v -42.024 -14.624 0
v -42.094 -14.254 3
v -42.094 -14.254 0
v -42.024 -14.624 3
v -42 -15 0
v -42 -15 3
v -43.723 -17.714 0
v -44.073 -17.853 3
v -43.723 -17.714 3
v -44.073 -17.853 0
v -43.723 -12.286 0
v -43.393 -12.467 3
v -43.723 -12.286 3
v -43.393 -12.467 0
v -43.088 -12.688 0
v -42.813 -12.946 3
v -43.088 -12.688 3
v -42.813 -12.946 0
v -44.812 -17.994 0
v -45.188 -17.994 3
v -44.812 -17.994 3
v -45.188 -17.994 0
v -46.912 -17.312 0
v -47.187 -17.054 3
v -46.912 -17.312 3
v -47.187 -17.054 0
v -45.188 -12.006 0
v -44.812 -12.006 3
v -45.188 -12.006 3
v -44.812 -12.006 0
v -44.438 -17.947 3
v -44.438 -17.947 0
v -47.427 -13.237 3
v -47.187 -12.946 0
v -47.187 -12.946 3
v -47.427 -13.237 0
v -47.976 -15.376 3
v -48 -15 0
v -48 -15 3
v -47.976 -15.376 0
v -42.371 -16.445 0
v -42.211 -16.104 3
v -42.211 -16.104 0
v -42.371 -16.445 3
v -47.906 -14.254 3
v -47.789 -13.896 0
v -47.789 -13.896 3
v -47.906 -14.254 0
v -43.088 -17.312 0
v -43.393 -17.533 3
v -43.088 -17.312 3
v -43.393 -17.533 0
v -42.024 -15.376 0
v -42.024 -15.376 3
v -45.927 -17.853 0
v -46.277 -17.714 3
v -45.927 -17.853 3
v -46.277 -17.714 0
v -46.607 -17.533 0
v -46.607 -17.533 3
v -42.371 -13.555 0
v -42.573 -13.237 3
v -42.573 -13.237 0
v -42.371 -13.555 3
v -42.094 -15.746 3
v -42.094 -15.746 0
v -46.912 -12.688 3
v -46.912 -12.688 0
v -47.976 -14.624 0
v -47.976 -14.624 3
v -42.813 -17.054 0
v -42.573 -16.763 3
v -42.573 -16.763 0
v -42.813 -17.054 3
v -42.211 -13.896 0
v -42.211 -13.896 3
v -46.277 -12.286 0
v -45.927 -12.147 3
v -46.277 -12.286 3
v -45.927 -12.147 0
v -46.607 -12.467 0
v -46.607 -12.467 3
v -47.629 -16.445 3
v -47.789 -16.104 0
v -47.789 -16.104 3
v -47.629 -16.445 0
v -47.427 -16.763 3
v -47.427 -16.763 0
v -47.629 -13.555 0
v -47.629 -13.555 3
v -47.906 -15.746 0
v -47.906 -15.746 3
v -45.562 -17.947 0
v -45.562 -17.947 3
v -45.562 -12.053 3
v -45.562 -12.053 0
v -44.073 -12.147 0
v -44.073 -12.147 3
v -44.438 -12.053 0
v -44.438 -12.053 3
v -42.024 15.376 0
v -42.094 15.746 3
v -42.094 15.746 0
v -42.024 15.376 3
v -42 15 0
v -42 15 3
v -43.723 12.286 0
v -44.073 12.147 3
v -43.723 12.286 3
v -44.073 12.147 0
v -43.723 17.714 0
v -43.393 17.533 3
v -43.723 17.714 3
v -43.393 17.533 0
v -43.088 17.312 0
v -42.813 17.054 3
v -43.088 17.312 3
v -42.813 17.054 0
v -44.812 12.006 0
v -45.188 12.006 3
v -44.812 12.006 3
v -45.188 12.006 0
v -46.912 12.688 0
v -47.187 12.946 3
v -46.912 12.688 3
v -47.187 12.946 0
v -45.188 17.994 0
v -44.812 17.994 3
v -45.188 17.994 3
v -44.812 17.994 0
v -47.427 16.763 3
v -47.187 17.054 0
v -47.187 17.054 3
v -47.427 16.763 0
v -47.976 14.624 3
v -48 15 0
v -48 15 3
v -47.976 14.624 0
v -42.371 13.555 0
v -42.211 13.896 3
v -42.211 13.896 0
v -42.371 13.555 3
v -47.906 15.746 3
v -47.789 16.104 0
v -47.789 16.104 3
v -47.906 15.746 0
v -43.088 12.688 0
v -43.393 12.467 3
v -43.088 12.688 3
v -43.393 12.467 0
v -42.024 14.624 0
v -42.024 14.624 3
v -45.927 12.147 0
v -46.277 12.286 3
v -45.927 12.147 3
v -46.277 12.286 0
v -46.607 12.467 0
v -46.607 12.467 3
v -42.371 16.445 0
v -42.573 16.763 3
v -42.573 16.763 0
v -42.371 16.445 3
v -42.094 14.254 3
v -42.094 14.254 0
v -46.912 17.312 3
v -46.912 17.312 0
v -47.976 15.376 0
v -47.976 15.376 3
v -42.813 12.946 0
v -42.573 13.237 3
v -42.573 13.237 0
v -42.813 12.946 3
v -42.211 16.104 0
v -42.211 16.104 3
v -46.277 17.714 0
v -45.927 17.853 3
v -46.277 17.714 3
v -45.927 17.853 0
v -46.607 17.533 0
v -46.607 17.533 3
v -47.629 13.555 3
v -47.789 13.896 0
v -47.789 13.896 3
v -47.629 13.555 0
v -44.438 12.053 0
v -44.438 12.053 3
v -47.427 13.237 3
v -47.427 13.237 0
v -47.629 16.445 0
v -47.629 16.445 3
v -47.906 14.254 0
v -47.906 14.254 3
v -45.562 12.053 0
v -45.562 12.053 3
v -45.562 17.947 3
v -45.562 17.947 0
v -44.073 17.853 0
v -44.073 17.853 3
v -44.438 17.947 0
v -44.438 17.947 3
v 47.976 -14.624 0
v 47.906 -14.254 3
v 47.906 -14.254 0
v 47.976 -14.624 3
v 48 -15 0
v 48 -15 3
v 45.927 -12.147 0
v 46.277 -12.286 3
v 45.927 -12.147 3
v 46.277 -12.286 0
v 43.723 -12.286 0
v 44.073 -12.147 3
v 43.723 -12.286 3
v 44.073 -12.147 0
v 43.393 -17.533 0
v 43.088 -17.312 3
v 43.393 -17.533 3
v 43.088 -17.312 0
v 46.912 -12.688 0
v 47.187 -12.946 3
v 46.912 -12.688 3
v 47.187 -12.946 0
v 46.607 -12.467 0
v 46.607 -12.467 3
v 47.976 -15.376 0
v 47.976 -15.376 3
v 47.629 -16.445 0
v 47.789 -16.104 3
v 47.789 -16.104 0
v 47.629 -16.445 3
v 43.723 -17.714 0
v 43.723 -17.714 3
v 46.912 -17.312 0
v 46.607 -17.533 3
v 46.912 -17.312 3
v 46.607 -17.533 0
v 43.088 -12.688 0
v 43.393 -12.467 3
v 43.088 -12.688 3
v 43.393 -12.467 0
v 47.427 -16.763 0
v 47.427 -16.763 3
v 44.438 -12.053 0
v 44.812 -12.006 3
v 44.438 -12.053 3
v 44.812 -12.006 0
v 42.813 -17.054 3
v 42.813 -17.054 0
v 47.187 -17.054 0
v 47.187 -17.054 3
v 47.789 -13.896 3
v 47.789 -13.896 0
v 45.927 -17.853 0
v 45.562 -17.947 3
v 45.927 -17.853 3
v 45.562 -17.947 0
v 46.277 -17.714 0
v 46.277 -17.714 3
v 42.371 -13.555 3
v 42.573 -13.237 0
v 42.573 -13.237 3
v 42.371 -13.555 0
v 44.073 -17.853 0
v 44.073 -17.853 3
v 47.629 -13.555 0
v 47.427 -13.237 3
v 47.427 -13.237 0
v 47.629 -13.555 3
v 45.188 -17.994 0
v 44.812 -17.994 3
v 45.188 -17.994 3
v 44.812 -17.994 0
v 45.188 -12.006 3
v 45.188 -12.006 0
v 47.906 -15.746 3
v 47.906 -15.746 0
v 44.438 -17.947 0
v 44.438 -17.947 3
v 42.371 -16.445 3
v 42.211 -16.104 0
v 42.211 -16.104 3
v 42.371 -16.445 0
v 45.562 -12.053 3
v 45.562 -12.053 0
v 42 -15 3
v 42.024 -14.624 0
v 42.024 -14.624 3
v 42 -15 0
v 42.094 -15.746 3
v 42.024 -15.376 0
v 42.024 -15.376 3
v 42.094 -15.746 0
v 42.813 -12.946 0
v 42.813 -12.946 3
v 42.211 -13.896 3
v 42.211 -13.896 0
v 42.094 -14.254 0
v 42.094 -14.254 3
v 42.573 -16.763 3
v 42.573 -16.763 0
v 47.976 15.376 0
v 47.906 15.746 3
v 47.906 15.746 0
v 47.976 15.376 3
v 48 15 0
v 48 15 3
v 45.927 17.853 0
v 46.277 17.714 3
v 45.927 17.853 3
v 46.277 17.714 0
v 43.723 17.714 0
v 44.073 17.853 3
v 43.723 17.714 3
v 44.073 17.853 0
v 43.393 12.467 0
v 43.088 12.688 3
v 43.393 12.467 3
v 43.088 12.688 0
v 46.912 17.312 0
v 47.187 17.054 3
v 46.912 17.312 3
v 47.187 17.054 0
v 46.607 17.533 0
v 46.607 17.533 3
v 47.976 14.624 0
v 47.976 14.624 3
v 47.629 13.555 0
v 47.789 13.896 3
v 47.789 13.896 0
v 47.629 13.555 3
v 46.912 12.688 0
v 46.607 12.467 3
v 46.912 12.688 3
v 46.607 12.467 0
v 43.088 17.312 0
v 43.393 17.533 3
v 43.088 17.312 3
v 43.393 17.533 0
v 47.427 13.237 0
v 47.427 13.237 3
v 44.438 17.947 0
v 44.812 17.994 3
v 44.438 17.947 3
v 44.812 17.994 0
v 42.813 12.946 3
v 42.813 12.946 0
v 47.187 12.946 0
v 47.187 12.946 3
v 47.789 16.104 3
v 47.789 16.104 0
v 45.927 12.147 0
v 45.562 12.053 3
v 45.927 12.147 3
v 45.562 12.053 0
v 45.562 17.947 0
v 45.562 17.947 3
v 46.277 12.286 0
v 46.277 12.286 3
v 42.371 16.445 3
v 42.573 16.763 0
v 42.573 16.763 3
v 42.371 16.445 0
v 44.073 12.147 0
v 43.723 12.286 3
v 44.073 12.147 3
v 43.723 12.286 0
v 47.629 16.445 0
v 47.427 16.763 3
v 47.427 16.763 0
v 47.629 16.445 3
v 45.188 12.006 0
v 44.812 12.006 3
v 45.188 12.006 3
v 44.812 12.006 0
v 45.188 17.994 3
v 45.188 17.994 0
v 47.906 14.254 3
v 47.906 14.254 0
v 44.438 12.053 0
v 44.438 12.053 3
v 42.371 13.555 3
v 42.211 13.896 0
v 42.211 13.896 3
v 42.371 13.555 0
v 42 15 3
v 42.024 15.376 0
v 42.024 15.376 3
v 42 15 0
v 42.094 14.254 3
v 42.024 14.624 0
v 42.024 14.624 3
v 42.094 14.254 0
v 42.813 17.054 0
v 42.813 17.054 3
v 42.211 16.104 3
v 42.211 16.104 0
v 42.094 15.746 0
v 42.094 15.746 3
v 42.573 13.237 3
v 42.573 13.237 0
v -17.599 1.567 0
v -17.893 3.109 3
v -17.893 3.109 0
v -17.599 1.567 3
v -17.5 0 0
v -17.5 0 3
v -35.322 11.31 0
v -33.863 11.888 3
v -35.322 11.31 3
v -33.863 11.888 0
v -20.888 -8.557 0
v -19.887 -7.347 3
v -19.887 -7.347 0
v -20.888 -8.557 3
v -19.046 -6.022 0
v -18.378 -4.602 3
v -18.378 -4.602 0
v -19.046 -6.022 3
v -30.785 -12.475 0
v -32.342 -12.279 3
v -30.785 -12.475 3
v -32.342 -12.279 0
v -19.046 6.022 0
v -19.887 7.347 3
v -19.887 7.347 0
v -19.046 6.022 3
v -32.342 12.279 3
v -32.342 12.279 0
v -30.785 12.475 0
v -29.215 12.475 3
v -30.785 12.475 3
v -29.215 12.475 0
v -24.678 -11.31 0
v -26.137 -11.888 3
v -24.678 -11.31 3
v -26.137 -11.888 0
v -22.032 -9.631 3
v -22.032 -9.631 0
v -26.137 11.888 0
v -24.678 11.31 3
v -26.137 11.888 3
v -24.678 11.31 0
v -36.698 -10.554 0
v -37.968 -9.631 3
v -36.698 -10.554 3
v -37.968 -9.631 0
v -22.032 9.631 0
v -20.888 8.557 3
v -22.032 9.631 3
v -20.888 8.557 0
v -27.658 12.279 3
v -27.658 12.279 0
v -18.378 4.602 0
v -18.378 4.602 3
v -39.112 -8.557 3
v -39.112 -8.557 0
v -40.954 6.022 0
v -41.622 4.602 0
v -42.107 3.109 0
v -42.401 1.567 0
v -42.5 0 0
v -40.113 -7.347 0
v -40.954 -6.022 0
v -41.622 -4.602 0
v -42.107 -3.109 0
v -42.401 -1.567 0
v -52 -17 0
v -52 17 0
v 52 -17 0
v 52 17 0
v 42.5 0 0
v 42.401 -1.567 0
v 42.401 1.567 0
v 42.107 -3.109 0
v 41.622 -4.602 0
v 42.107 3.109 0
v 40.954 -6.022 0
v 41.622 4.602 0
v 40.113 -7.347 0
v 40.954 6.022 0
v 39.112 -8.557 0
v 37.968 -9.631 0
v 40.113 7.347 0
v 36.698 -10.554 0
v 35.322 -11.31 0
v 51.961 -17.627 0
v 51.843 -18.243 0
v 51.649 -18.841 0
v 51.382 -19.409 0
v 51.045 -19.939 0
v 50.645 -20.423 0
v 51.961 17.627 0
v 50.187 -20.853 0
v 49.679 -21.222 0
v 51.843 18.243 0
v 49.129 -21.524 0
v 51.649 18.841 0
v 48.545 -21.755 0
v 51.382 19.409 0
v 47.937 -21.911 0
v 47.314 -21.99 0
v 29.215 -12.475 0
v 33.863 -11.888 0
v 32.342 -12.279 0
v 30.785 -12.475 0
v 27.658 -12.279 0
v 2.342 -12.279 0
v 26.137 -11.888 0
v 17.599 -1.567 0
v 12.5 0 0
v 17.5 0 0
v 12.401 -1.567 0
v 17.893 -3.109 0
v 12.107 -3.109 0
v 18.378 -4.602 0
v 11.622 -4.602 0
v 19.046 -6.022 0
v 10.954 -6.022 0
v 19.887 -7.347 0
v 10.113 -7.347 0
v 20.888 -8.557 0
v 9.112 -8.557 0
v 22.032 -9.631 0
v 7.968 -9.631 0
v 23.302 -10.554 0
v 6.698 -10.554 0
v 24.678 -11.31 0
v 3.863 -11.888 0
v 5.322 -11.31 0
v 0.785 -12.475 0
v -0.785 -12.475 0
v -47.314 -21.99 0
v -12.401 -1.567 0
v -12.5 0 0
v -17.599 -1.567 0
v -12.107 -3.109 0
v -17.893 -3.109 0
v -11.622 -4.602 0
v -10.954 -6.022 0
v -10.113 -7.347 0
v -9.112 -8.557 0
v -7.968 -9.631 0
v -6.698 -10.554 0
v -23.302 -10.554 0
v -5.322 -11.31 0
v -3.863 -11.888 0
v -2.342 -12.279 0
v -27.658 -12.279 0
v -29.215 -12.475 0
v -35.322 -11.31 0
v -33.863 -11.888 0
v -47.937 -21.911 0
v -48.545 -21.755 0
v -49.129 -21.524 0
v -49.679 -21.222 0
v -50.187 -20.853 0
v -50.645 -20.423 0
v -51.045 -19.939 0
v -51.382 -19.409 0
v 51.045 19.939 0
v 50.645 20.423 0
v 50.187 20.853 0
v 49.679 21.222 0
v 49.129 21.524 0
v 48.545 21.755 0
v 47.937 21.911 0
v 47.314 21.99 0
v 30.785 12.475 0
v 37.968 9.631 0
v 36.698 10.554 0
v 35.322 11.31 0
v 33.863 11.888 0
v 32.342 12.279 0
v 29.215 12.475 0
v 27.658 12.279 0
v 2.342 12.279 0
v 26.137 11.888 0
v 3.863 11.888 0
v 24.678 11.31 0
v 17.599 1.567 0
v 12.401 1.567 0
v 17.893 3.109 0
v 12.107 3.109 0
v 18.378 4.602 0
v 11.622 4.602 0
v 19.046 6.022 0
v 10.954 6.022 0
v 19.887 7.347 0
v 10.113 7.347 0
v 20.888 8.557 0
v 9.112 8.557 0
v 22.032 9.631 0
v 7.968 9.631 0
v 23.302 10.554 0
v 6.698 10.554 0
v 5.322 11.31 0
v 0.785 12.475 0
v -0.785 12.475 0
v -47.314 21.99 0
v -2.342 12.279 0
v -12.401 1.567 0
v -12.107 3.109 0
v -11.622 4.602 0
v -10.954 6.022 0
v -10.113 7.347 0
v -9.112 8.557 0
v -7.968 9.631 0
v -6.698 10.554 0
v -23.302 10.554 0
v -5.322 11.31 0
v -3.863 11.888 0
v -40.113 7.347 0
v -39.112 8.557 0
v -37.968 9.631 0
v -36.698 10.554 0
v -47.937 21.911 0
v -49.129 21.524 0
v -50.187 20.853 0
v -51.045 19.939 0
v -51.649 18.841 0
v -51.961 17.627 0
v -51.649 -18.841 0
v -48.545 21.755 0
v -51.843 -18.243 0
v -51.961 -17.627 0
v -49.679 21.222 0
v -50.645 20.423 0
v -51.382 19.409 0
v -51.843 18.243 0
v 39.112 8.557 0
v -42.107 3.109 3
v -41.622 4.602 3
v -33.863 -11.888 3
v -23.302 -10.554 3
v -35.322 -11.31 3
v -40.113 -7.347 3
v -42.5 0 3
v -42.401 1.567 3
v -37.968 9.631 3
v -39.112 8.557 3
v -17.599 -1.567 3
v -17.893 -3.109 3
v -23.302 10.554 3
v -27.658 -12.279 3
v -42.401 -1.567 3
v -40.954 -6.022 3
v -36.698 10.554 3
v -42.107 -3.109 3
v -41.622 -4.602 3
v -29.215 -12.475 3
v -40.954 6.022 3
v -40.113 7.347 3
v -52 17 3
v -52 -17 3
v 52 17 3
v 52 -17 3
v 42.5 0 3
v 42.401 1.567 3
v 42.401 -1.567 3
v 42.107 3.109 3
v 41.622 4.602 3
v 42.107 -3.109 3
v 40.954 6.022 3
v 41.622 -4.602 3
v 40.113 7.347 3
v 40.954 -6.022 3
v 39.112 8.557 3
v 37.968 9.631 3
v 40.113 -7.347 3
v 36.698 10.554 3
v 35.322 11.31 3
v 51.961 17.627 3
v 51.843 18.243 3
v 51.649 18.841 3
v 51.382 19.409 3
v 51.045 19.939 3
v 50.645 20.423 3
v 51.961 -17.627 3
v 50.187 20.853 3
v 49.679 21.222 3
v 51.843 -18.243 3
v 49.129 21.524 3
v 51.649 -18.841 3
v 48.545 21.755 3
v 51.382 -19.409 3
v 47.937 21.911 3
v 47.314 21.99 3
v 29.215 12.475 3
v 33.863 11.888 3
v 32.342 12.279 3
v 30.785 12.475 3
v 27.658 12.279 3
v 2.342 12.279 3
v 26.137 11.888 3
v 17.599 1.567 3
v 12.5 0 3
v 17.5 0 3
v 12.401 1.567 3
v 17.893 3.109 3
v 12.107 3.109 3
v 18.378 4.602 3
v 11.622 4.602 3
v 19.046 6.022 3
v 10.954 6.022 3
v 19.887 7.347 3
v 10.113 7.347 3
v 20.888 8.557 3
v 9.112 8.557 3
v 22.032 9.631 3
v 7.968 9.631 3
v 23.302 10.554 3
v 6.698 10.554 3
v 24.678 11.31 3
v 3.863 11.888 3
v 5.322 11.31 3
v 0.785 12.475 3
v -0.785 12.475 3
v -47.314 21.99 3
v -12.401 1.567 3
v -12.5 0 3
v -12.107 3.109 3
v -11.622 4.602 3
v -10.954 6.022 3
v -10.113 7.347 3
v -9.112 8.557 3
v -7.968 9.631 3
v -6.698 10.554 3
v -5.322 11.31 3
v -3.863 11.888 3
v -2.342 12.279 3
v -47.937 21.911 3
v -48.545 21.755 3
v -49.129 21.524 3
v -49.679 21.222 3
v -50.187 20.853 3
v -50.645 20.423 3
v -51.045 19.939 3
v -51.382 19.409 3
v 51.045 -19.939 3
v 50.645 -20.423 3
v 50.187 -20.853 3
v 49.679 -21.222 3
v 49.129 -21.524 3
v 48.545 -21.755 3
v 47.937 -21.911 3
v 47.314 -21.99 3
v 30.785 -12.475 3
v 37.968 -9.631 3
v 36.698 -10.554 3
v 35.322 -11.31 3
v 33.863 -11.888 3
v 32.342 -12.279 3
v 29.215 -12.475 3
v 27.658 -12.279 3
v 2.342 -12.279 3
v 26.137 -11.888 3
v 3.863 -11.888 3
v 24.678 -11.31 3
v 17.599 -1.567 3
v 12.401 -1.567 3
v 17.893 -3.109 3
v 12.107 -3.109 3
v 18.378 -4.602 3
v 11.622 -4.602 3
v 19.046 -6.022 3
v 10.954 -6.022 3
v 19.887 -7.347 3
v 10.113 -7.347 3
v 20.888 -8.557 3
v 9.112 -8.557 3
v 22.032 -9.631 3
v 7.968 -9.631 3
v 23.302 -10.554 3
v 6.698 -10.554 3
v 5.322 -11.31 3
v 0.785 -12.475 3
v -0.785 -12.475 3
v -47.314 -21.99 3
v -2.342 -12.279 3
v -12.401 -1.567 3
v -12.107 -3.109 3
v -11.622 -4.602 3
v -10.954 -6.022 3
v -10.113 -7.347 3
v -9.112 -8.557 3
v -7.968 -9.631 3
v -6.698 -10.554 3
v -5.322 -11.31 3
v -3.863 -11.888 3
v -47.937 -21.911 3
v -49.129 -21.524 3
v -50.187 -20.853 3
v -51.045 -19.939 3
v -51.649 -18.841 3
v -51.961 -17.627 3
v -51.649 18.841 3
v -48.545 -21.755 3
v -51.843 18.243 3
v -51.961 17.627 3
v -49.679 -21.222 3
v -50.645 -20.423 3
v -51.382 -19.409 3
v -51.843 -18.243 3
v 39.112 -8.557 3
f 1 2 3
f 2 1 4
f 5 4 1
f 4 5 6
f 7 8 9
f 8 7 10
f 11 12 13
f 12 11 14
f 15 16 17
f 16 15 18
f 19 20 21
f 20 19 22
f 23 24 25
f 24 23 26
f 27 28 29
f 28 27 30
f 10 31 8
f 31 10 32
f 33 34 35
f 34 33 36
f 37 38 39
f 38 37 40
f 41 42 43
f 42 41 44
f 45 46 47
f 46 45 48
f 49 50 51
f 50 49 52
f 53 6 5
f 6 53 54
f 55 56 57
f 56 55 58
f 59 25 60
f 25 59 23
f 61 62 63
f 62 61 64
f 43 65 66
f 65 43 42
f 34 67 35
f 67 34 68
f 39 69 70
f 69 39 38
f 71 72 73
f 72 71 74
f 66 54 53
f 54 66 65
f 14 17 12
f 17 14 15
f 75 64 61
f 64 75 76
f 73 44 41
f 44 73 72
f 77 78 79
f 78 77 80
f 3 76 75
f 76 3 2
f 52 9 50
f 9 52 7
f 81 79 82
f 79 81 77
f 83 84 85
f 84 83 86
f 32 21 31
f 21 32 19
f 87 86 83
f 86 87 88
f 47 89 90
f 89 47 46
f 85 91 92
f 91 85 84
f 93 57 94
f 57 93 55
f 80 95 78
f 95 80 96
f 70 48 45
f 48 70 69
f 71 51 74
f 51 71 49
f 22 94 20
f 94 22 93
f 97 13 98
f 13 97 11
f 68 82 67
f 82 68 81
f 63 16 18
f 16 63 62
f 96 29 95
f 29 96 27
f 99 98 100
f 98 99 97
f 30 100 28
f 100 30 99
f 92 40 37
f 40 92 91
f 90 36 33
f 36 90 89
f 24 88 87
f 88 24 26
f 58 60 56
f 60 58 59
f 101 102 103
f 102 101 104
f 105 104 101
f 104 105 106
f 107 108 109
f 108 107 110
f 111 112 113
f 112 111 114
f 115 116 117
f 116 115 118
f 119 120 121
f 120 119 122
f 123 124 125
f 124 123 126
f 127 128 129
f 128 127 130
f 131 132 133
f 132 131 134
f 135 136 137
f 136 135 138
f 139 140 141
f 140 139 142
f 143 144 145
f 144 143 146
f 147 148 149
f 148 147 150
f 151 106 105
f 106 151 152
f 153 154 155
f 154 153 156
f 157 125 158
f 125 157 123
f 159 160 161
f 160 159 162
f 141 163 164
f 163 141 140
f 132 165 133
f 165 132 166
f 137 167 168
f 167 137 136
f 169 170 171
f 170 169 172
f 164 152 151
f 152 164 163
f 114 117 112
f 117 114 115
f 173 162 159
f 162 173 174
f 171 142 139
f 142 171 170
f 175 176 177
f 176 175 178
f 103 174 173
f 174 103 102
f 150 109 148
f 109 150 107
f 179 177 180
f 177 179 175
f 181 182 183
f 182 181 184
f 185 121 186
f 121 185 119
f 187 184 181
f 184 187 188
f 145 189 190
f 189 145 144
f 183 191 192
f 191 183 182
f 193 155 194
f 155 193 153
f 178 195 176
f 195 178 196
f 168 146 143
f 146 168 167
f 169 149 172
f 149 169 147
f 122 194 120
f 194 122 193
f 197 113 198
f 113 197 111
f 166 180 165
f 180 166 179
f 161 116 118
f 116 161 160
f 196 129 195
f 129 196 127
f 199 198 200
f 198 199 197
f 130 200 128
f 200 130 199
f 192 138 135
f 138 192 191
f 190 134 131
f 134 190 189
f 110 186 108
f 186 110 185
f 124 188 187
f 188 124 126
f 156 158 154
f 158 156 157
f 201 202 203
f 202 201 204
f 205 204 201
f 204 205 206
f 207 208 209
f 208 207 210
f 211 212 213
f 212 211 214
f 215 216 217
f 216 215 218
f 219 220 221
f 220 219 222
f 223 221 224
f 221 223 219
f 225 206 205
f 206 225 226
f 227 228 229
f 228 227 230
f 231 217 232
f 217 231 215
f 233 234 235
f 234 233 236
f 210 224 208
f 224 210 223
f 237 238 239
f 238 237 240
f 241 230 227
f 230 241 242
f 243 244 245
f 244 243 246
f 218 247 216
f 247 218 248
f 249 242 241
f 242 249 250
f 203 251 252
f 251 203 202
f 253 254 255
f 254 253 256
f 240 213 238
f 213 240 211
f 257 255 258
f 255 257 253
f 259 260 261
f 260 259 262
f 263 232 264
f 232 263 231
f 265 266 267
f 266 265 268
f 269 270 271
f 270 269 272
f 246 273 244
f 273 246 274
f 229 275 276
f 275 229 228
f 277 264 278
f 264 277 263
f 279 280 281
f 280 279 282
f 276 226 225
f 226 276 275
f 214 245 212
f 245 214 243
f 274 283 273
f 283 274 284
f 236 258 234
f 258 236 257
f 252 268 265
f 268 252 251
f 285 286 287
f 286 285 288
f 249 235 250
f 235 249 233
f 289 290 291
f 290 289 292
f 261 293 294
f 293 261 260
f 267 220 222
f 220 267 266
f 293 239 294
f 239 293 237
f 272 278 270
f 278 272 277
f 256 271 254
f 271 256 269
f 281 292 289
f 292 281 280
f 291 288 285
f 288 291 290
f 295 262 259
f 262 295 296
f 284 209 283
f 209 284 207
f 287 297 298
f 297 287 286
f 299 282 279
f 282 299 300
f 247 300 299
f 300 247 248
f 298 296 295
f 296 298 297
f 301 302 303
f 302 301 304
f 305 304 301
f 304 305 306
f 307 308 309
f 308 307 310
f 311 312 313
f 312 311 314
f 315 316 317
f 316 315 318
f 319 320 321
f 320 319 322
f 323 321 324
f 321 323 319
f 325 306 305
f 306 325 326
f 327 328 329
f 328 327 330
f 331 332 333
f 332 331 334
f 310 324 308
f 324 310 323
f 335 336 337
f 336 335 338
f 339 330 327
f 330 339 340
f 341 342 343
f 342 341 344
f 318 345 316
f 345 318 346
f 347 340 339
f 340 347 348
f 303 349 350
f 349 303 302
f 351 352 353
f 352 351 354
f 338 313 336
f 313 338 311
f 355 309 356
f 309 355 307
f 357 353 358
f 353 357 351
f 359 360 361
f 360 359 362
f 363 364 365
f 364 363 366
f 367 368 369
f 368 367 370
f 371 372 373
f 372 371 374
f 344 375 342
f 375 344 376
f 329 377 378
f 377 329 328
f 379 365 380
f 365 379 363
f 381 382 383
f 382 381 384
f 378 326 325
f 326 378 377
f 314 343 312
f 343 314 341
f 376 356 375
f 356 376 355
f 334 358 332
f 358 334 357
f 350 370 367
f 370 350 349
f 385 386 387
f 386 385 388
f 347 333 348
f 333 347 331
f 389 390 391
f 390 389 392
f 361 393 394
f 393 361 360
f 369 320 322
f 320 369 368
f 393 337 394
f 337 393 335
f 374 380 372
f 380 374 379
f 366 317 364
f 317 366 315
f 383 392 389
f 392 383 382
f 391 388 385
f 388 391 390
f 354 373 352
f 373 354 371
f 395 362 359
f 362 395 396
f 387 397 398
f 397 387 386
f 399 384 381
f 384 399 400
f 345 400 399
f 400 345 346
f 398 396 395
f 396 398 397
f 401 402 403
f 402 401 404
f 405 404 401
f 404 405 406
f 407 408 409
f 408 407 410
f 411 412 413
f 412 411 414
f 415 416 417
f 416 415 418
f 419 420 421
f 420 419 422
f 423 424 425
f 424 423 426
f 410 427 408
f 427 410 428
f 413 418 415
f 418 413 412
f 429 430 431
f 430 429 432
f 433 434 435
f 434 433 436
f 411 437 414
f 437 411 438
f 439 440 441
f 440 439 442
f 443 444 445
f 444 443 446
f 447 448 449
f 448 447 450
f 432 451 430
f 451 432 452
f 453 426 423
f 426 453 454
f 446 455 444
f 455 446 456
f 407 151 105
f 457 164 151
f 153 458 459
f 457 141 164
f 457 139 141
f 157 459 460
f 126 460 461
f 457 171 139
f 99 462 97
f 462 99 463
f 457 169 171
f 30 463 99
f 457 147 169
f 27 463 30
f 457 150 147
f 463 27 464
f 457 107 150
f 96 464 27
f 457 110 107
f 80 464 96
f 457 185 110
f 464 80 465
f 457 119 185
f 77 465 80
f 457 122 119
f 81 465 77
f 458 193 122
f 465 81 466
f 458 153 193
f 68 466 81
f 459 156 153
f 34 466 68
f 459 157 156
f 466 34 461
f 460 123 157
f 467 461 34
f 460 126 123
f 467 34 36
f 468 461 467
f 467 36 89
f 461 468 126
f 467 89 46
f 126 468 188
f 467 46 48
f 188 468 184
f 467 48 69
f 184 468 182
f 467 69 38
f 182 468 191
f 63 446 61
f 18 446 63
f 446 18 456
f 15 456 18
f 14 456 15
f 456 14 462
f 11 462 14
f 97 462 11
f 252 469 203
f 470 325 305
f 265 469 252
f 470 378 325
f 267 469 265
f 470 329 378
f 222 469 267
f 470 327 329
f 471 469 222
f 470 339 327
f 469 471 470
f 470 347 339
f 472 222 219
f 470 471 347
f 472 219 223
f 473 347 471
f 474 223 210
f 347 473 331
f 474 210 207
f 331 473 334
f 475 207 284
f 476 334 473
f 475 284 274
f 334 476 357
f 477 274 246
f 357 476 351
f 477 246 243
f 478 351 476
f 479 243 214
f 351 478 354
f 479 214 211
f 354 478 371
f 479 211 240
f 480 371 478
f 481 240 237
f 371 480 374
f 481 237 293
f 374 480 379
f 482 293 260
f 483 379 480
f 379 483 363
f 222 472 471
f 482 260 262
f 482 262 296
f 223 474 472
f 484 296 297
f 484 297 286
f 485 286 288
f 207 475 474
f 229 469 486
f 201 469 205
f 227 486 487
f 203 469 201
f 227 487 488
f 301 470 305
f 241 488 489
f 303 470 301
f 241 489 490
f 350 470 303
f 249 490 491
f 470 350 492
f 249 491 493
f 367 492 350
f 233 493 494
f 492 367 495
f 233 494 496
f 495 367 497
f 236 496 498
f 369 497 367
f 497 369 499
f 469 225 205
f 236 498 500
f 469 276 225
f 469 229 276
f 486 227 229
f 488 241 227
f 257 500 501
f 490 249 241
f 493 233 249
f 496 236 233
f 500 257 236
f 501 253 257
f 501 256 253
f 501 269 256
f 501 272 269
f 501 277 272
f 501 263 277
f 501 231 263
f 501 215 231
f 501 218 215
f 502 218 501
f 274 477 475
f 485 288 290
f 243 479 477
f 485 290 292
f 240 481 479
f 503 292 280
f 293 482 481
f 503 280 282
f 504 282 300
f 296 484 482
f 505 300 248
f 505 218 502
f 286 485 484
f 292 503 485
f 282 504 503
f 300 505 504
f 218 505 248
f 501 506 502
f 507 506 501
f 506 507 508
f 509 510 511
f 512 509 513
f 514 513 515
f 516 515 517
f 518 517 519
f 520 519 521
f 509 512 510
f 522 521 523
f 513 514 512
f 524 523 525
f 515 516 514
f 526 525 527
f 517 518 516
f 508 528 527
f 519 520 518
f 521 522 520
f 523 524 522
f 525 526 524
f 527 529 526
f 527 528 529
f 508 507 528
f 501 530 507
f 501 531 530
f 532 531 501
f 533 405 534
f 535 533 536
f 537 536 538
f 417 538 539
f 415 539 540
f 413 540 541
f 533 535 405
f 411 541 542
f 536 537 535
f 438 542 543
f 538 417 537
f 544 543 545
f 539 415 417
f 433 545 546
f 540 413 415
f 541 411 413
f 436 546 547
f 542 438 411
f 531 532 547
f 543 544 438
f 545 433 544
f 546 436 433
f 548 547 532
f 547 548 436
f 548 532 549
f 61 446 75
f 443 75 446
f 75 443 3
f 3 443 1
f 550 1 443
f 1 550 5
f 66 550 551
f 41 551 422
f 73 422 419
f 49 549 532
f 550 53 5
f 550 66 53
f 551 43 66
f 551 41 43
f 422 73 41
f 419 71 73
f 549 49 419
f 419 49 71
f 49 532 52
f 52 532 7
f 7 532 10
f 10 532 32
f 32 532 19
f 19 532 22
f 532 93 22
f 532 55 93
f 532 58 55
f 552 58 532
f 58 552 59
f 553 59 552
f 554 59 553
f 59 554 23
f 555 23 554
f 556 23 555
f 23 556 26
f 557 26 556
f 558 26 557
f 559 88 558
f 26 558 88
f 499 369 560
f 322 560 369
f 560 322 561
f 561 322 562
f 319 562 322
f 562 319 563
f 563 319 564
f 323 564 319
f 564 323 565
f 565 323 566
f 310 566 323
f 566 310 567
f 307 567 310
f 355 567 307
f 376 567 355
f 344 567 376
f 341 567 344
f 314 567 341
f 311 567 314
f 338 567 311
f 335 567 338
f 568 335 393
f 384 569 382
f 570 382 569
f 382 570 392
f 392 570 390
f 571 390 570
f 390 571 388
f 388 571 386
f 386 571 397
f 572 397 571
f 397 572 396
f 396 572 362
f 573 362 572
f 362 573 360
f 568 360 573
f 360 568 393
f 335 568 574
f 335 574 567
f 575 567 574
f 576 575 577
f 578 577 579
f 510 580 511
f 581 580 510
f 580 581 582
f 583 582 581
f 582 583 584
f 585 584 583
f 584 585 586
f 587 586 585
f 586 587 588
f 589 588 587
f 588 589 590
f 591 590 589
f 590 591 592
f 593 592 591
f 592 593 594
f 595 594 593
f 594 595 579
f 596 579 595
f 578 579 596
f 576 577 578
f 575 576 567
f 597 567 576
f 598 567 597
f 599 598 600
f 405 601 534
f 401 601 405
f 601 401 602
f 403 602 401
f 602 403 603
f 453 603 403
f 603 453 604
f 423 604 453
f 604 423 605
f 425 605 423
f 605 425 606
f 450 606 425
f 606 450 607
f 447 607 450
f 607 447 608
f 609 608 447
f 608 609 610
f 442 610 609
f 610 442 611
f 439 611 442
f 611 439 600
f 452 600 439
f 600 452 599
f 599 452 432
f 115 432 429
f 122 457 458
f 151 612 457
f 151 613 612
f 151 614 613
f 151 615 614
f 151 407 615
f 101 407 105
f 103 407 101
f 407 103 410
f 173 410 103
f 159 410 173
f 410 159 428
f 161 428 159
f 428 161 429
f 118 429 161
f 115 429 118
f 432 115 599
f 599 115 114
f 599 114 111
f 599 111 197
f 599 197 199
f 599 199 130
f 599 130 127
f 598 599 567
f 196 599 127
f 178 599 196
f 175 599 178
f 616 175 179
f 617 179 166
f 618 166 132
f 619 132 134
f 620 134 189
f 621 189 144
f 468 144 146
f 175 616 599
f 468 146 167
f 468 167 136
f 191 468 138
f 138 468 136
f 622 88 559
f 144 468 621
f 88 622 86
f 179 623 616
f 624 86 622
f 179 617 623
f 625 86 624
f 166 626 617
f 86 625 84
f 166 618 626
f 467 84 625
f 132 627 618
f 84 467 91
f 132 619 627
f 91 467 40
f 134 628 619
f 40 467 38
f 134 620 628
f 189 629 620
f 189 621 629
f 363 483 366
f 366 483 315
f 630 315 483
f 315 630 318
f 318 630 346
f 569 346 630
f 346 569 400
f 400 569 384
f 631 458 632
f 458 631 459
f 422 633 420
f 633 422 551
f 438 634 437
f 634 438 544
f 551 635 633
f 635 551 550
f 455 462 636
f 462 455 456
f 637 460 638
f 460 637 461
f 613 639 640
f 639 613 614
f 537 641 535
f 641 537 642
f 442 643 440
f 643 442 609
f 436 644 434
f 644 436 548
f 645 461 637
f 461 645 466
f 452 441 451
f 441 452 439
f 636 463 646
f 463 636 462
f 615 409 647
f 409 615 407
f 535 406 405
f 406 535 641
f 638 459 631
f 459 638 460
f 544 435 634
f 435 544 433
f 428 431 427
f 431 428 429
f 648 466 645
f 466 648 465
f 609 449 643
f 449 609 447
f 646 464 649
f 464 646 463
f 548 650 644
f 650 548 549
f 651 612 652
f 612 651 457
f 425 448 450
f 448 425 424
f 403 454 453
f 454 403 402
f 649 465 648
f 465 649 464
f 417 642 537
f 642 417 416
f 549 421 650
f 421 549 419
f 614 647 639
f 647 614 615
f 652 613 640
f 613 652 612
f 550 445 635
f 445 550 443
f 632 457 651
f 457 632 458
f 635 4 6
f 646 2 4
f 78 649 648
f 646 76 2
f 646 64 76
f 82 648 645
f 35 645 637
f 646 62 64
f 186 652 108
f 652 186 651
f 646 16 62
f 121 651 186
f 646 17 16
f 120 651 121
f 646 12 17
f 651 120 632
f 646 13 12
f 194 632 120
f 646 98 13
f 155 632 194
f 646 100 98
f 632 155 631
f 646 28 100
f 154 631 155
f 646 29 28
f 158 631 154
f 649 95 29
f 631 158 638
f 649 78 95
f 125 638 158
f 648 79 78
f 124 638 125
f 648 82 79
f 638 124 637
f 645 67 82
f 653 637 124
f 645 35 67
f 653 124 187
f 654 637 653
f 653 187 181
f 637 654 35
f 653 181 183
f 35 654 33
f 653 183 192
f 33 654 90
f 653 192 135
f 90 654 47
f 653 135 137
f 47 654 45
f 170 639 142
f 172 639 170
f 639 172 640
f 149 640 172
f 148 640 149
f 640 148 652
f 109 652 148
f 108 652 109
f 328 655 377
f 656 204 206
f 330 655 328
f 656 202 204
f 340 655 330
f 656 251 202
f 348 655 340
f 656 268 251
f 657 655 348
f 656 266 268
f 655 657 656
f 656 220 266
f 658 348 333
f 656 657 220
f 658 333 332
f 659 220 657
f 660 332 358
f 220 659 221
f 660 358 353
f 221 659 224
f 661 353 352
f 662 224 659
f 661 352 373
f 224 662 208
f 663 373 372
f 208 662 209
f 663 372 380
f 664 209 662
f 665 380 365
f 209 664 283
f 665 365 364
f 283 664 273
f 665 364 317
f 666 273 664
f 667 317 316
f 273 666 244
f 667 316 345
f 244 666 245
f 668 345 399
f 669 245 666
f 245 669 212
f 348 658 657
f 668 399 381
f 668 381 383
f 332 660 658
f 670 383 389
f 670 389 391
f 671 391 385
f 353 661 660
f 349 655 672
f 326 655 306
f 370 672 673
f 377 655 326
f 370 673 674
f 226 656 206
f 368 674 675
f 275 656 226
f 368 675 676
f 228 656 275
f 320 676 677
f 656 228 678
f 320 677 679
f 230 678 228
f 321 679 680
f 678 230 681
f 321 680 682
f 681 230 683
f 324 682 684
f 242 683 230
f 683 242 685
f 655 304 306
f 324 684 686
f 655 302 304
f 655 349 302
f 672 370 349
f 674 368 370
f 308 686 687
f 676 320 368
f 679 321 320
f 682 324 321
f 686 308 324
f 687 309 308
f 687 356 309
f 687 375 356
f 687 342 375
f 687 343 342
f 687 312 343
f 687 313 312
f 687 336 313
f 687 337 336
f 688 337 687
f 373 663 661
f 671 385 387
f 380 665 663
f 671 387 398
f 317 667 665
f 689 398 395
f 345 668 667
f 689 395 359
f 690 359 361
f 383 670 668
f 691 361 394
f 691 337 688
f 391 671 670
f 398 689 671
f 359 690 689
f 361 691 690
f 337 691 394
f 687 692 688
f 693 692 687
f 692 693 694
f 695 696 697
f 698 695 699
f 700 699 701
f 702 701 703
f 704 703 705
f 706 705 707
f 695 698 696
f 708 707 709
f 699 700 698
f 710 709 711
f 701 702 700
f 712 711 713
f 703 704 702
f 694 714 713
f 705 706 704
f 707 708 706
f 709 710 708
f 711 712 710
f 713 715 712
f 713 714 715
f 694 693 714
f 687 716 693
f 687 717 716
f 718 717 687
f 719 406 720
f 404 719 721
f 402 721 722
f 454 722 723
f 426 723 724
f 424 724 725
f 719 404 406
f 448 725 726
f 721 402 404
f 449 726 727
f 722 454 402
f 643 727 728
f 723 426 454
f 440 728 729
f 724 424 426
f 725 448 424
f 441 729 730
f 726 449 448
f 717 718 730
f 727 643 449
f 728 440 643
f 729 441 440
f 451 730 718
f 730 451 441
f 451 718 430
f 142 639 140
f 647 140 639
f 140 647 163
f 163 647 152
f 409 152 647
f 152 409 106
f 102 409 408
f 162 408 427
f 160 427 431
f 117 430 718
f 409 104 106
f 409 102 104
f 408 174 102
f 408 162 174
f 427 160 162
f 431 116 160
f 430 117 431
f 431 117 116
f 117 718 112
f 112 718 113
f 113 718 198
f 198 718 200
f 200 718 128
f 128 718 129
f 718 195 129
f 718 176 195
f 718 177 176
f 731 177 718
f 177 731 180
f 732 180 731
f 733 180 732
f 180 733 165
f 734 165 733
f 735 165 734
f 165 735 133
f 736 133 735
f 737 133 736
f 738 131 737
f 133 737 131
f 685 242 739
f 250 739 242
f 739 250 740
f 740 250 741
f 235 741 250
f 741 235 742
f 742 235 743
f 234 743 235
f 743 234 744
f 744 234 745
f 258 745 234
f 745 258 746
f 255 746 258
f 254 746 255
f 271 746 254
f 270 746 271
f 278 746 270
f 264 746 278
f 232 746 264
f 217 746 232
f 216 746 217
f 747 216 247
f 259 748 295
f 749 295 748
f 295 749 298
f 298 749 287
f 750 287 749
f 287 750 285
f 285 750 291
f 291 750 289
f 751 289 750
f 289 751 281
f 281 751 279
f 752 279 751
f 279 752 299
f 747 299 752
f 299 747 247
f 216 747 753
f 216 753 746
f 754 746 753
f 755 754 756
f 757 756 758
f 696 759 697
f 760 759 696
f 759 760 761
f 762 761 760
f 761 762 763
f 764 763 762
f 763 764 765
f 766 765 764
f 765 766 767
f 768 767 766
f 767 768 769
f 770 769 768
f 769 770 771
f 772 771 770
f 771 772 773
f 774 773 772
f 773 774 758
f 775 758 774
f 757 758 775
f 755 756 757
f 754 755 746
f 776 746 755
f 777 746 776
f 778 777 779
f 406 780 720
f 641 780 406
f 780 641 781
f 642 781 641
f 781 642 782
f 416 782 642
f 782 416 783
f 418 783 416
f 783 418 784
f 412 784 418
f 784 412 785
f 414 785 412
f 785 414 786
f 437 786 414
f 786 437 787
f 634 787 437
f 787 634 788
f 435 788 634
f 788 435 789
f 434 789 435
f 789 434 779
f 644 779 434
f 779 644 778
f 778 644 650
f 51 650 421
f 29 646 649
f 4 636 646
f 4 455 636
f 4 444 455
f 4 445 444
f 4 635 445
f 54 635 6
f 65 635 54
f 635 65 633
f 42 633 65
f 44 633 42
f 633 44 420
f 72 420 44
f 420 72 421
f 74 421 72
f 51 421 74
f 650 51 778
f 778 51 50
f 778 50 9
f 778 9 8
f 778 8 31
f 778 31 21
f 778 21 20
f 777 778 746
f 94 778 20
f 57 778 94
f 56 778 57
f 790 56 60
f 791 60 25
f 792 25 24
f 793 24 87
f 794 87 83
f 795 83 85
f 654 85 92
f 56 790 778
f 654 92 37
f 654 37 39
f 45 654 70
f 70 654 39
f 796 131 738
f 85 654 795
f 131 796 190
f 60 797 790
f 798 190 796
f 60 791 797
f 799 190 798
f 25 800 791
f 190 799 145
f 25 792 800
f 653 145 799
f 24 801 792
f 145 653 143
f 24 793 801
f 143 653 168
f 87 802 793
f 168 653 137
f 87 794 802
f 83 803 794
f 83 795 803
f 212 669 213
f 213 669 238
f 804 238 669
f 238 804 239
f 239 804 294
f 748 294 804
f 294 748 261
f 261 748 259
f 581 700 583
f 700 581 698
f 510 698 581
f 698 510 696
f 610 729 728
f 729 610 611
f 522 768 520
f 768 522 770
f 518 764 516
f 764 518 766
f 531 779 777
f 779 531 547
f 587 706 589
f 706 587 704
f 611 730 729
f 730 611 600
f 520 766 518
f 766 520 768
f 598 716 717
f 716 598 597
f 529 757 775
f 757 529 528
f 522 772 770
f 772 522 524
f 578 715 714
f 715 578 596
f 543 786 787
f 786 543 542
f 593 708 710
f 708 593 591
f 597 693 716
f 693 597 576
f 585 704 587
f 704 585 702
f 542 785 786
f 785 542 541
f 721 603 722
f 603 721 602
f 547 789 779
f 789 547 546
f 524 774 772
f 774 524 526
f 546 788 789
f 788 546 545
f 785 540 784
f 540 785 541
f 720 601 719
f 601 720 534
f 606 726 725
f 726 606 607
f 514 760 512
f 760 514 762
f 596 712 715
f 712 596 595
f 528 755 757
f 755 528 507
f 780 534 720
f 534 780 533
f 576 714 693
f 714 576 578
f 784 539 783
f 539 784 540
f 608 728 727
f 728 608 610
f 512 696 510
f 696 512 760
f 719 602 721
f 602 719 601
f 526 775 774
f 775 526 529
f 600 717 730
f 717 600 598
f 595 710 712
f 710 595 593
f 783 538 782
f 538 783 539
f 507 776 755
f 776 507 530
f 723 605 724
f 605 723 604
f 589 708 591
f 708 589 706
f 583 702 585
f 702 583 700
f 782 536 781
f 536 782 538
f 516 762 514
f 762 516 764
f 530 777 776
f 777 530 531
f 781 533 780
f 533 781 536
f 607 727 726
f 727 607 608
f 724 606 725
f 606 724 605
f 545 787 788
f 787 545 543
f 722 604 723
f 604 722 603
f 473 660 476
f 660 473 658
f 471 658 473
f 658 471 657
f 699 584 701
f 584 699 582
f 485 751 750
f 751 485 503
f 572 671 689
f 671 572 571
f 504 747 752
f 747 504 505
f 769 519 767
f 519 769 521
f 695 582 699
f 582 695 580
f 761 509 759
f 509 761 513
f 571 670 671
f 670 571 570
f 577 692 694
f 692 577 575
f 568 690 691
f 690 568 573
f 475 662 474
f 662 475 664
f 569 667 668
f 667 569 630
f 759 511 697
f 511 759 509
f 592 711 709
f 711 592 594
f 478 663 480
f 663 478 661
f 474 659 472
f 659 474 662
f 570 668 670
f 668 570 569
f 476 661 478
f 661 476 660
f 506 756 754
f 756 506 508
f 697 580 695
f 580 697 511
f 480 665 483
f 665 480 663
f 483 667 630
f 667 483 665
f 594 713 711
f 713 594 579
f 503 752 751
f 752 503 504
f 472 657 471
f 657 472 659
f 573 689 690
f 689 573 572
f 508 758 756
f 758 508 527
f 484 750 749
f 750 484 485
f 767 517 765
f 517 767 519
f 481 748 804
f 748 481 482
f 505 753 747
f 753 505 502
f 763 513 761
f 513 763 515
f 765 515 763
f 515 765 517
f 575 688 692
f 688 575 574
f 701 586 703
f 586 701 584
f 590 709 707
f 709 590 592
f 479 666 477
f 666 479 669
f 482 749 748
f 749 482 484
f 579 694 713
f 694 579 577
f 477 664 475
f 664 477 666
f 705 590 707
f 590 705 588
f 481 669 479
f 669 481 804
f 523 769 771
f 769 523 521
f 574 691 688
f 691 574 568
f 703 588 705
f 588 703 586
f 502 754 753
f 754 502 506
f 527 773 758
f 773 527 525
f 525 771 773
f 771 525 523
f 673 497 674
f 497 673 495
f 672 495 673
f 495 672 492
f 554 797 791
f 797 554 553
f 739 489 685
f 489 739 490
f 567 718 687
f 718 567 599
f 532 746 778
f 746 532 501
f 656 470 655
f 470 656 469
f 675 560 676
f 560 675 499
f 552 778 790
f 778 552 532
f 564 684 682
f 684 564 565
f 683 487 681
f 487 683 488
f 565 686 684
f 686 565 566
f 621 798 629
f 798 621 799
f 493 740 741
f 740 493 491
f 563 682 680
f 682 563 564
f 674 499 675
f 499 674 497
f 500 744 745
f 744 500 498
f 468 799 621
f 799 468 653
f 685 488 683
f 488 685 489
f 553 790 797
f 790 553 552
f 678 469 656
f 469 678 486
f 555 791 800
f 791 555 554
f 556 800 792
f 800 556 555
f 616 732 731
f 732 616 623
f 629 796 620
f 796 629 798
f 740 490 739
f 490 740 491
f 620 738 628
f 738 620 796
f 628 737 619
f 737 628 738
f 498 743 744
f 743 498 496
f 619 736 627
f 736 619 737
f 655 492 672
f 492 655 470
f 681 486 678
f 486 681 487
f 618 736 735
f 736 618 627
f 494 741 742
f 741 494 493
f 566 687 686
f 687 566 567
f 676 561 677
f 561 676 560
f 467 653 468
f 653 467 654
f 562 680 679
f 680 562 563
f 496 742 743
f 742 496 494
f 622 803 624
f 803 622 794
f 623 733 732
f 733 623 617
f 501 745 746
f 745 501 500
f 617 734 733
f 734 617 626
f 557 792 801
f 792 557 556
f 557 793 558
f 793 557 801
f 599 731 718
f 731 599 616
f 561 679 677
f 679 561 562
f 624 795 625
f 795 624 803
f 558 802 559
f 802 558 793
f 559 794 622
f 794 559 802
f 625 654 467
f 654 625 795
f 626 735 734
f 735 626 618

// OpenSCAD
$fn = 50;


difference() {
	union() {
		hull() {
			translate(v = [-47.0000000000, 17.0000000000, 0]) {
				cylinder(h = 3, r = 5);
			}
			translate(v = [47.0000000000, 17.0000000000, 0]) {
				cylinder(h = 3, r = 5);
			}
			translate(v = [-47.0000000000, -17.0000000000, 0]) {
				cylinder(h = 3, r = 5);
			}
			translate(v = [47.0000000000, -17.0000000000, 0]) {
				cylinder(h = 3, r = 5);
			}
		}
	}
	union() {
		#translate(v = [-45.0000000000, -15.0000000000, -100.0000000000]) {
			cylinder(h = 200, r = 3.0000000000);
		}
		#translate(v = [-45.0000000000, 15.0000000000, -100.0000000000]) {
			cylinder(h = 200, r = 3.0000000000);
		}
		#translate(v = [45.0000000000, -15.0000000000, -100.0000000000]) {
			cylinder(h = 200, r = 3.0000000000);
		}
		#translate(v = [45.0000000000, 15.0000000000, -100.0000000000]) {
			cylinder(h = 200, r = 3.0000000000);
		}
		#translate(v = [-30.0000000000, 0, 0]) {
			cylinder(h = 3, r = 12.5000000000);
		}
		#cylinder(h = 3, r = 12.5000000000);
		#translate(v = [30.0000000000, 0, 0]) {
			cylinder(h = 3, r = 12.5000000000);
		}
	}
}
